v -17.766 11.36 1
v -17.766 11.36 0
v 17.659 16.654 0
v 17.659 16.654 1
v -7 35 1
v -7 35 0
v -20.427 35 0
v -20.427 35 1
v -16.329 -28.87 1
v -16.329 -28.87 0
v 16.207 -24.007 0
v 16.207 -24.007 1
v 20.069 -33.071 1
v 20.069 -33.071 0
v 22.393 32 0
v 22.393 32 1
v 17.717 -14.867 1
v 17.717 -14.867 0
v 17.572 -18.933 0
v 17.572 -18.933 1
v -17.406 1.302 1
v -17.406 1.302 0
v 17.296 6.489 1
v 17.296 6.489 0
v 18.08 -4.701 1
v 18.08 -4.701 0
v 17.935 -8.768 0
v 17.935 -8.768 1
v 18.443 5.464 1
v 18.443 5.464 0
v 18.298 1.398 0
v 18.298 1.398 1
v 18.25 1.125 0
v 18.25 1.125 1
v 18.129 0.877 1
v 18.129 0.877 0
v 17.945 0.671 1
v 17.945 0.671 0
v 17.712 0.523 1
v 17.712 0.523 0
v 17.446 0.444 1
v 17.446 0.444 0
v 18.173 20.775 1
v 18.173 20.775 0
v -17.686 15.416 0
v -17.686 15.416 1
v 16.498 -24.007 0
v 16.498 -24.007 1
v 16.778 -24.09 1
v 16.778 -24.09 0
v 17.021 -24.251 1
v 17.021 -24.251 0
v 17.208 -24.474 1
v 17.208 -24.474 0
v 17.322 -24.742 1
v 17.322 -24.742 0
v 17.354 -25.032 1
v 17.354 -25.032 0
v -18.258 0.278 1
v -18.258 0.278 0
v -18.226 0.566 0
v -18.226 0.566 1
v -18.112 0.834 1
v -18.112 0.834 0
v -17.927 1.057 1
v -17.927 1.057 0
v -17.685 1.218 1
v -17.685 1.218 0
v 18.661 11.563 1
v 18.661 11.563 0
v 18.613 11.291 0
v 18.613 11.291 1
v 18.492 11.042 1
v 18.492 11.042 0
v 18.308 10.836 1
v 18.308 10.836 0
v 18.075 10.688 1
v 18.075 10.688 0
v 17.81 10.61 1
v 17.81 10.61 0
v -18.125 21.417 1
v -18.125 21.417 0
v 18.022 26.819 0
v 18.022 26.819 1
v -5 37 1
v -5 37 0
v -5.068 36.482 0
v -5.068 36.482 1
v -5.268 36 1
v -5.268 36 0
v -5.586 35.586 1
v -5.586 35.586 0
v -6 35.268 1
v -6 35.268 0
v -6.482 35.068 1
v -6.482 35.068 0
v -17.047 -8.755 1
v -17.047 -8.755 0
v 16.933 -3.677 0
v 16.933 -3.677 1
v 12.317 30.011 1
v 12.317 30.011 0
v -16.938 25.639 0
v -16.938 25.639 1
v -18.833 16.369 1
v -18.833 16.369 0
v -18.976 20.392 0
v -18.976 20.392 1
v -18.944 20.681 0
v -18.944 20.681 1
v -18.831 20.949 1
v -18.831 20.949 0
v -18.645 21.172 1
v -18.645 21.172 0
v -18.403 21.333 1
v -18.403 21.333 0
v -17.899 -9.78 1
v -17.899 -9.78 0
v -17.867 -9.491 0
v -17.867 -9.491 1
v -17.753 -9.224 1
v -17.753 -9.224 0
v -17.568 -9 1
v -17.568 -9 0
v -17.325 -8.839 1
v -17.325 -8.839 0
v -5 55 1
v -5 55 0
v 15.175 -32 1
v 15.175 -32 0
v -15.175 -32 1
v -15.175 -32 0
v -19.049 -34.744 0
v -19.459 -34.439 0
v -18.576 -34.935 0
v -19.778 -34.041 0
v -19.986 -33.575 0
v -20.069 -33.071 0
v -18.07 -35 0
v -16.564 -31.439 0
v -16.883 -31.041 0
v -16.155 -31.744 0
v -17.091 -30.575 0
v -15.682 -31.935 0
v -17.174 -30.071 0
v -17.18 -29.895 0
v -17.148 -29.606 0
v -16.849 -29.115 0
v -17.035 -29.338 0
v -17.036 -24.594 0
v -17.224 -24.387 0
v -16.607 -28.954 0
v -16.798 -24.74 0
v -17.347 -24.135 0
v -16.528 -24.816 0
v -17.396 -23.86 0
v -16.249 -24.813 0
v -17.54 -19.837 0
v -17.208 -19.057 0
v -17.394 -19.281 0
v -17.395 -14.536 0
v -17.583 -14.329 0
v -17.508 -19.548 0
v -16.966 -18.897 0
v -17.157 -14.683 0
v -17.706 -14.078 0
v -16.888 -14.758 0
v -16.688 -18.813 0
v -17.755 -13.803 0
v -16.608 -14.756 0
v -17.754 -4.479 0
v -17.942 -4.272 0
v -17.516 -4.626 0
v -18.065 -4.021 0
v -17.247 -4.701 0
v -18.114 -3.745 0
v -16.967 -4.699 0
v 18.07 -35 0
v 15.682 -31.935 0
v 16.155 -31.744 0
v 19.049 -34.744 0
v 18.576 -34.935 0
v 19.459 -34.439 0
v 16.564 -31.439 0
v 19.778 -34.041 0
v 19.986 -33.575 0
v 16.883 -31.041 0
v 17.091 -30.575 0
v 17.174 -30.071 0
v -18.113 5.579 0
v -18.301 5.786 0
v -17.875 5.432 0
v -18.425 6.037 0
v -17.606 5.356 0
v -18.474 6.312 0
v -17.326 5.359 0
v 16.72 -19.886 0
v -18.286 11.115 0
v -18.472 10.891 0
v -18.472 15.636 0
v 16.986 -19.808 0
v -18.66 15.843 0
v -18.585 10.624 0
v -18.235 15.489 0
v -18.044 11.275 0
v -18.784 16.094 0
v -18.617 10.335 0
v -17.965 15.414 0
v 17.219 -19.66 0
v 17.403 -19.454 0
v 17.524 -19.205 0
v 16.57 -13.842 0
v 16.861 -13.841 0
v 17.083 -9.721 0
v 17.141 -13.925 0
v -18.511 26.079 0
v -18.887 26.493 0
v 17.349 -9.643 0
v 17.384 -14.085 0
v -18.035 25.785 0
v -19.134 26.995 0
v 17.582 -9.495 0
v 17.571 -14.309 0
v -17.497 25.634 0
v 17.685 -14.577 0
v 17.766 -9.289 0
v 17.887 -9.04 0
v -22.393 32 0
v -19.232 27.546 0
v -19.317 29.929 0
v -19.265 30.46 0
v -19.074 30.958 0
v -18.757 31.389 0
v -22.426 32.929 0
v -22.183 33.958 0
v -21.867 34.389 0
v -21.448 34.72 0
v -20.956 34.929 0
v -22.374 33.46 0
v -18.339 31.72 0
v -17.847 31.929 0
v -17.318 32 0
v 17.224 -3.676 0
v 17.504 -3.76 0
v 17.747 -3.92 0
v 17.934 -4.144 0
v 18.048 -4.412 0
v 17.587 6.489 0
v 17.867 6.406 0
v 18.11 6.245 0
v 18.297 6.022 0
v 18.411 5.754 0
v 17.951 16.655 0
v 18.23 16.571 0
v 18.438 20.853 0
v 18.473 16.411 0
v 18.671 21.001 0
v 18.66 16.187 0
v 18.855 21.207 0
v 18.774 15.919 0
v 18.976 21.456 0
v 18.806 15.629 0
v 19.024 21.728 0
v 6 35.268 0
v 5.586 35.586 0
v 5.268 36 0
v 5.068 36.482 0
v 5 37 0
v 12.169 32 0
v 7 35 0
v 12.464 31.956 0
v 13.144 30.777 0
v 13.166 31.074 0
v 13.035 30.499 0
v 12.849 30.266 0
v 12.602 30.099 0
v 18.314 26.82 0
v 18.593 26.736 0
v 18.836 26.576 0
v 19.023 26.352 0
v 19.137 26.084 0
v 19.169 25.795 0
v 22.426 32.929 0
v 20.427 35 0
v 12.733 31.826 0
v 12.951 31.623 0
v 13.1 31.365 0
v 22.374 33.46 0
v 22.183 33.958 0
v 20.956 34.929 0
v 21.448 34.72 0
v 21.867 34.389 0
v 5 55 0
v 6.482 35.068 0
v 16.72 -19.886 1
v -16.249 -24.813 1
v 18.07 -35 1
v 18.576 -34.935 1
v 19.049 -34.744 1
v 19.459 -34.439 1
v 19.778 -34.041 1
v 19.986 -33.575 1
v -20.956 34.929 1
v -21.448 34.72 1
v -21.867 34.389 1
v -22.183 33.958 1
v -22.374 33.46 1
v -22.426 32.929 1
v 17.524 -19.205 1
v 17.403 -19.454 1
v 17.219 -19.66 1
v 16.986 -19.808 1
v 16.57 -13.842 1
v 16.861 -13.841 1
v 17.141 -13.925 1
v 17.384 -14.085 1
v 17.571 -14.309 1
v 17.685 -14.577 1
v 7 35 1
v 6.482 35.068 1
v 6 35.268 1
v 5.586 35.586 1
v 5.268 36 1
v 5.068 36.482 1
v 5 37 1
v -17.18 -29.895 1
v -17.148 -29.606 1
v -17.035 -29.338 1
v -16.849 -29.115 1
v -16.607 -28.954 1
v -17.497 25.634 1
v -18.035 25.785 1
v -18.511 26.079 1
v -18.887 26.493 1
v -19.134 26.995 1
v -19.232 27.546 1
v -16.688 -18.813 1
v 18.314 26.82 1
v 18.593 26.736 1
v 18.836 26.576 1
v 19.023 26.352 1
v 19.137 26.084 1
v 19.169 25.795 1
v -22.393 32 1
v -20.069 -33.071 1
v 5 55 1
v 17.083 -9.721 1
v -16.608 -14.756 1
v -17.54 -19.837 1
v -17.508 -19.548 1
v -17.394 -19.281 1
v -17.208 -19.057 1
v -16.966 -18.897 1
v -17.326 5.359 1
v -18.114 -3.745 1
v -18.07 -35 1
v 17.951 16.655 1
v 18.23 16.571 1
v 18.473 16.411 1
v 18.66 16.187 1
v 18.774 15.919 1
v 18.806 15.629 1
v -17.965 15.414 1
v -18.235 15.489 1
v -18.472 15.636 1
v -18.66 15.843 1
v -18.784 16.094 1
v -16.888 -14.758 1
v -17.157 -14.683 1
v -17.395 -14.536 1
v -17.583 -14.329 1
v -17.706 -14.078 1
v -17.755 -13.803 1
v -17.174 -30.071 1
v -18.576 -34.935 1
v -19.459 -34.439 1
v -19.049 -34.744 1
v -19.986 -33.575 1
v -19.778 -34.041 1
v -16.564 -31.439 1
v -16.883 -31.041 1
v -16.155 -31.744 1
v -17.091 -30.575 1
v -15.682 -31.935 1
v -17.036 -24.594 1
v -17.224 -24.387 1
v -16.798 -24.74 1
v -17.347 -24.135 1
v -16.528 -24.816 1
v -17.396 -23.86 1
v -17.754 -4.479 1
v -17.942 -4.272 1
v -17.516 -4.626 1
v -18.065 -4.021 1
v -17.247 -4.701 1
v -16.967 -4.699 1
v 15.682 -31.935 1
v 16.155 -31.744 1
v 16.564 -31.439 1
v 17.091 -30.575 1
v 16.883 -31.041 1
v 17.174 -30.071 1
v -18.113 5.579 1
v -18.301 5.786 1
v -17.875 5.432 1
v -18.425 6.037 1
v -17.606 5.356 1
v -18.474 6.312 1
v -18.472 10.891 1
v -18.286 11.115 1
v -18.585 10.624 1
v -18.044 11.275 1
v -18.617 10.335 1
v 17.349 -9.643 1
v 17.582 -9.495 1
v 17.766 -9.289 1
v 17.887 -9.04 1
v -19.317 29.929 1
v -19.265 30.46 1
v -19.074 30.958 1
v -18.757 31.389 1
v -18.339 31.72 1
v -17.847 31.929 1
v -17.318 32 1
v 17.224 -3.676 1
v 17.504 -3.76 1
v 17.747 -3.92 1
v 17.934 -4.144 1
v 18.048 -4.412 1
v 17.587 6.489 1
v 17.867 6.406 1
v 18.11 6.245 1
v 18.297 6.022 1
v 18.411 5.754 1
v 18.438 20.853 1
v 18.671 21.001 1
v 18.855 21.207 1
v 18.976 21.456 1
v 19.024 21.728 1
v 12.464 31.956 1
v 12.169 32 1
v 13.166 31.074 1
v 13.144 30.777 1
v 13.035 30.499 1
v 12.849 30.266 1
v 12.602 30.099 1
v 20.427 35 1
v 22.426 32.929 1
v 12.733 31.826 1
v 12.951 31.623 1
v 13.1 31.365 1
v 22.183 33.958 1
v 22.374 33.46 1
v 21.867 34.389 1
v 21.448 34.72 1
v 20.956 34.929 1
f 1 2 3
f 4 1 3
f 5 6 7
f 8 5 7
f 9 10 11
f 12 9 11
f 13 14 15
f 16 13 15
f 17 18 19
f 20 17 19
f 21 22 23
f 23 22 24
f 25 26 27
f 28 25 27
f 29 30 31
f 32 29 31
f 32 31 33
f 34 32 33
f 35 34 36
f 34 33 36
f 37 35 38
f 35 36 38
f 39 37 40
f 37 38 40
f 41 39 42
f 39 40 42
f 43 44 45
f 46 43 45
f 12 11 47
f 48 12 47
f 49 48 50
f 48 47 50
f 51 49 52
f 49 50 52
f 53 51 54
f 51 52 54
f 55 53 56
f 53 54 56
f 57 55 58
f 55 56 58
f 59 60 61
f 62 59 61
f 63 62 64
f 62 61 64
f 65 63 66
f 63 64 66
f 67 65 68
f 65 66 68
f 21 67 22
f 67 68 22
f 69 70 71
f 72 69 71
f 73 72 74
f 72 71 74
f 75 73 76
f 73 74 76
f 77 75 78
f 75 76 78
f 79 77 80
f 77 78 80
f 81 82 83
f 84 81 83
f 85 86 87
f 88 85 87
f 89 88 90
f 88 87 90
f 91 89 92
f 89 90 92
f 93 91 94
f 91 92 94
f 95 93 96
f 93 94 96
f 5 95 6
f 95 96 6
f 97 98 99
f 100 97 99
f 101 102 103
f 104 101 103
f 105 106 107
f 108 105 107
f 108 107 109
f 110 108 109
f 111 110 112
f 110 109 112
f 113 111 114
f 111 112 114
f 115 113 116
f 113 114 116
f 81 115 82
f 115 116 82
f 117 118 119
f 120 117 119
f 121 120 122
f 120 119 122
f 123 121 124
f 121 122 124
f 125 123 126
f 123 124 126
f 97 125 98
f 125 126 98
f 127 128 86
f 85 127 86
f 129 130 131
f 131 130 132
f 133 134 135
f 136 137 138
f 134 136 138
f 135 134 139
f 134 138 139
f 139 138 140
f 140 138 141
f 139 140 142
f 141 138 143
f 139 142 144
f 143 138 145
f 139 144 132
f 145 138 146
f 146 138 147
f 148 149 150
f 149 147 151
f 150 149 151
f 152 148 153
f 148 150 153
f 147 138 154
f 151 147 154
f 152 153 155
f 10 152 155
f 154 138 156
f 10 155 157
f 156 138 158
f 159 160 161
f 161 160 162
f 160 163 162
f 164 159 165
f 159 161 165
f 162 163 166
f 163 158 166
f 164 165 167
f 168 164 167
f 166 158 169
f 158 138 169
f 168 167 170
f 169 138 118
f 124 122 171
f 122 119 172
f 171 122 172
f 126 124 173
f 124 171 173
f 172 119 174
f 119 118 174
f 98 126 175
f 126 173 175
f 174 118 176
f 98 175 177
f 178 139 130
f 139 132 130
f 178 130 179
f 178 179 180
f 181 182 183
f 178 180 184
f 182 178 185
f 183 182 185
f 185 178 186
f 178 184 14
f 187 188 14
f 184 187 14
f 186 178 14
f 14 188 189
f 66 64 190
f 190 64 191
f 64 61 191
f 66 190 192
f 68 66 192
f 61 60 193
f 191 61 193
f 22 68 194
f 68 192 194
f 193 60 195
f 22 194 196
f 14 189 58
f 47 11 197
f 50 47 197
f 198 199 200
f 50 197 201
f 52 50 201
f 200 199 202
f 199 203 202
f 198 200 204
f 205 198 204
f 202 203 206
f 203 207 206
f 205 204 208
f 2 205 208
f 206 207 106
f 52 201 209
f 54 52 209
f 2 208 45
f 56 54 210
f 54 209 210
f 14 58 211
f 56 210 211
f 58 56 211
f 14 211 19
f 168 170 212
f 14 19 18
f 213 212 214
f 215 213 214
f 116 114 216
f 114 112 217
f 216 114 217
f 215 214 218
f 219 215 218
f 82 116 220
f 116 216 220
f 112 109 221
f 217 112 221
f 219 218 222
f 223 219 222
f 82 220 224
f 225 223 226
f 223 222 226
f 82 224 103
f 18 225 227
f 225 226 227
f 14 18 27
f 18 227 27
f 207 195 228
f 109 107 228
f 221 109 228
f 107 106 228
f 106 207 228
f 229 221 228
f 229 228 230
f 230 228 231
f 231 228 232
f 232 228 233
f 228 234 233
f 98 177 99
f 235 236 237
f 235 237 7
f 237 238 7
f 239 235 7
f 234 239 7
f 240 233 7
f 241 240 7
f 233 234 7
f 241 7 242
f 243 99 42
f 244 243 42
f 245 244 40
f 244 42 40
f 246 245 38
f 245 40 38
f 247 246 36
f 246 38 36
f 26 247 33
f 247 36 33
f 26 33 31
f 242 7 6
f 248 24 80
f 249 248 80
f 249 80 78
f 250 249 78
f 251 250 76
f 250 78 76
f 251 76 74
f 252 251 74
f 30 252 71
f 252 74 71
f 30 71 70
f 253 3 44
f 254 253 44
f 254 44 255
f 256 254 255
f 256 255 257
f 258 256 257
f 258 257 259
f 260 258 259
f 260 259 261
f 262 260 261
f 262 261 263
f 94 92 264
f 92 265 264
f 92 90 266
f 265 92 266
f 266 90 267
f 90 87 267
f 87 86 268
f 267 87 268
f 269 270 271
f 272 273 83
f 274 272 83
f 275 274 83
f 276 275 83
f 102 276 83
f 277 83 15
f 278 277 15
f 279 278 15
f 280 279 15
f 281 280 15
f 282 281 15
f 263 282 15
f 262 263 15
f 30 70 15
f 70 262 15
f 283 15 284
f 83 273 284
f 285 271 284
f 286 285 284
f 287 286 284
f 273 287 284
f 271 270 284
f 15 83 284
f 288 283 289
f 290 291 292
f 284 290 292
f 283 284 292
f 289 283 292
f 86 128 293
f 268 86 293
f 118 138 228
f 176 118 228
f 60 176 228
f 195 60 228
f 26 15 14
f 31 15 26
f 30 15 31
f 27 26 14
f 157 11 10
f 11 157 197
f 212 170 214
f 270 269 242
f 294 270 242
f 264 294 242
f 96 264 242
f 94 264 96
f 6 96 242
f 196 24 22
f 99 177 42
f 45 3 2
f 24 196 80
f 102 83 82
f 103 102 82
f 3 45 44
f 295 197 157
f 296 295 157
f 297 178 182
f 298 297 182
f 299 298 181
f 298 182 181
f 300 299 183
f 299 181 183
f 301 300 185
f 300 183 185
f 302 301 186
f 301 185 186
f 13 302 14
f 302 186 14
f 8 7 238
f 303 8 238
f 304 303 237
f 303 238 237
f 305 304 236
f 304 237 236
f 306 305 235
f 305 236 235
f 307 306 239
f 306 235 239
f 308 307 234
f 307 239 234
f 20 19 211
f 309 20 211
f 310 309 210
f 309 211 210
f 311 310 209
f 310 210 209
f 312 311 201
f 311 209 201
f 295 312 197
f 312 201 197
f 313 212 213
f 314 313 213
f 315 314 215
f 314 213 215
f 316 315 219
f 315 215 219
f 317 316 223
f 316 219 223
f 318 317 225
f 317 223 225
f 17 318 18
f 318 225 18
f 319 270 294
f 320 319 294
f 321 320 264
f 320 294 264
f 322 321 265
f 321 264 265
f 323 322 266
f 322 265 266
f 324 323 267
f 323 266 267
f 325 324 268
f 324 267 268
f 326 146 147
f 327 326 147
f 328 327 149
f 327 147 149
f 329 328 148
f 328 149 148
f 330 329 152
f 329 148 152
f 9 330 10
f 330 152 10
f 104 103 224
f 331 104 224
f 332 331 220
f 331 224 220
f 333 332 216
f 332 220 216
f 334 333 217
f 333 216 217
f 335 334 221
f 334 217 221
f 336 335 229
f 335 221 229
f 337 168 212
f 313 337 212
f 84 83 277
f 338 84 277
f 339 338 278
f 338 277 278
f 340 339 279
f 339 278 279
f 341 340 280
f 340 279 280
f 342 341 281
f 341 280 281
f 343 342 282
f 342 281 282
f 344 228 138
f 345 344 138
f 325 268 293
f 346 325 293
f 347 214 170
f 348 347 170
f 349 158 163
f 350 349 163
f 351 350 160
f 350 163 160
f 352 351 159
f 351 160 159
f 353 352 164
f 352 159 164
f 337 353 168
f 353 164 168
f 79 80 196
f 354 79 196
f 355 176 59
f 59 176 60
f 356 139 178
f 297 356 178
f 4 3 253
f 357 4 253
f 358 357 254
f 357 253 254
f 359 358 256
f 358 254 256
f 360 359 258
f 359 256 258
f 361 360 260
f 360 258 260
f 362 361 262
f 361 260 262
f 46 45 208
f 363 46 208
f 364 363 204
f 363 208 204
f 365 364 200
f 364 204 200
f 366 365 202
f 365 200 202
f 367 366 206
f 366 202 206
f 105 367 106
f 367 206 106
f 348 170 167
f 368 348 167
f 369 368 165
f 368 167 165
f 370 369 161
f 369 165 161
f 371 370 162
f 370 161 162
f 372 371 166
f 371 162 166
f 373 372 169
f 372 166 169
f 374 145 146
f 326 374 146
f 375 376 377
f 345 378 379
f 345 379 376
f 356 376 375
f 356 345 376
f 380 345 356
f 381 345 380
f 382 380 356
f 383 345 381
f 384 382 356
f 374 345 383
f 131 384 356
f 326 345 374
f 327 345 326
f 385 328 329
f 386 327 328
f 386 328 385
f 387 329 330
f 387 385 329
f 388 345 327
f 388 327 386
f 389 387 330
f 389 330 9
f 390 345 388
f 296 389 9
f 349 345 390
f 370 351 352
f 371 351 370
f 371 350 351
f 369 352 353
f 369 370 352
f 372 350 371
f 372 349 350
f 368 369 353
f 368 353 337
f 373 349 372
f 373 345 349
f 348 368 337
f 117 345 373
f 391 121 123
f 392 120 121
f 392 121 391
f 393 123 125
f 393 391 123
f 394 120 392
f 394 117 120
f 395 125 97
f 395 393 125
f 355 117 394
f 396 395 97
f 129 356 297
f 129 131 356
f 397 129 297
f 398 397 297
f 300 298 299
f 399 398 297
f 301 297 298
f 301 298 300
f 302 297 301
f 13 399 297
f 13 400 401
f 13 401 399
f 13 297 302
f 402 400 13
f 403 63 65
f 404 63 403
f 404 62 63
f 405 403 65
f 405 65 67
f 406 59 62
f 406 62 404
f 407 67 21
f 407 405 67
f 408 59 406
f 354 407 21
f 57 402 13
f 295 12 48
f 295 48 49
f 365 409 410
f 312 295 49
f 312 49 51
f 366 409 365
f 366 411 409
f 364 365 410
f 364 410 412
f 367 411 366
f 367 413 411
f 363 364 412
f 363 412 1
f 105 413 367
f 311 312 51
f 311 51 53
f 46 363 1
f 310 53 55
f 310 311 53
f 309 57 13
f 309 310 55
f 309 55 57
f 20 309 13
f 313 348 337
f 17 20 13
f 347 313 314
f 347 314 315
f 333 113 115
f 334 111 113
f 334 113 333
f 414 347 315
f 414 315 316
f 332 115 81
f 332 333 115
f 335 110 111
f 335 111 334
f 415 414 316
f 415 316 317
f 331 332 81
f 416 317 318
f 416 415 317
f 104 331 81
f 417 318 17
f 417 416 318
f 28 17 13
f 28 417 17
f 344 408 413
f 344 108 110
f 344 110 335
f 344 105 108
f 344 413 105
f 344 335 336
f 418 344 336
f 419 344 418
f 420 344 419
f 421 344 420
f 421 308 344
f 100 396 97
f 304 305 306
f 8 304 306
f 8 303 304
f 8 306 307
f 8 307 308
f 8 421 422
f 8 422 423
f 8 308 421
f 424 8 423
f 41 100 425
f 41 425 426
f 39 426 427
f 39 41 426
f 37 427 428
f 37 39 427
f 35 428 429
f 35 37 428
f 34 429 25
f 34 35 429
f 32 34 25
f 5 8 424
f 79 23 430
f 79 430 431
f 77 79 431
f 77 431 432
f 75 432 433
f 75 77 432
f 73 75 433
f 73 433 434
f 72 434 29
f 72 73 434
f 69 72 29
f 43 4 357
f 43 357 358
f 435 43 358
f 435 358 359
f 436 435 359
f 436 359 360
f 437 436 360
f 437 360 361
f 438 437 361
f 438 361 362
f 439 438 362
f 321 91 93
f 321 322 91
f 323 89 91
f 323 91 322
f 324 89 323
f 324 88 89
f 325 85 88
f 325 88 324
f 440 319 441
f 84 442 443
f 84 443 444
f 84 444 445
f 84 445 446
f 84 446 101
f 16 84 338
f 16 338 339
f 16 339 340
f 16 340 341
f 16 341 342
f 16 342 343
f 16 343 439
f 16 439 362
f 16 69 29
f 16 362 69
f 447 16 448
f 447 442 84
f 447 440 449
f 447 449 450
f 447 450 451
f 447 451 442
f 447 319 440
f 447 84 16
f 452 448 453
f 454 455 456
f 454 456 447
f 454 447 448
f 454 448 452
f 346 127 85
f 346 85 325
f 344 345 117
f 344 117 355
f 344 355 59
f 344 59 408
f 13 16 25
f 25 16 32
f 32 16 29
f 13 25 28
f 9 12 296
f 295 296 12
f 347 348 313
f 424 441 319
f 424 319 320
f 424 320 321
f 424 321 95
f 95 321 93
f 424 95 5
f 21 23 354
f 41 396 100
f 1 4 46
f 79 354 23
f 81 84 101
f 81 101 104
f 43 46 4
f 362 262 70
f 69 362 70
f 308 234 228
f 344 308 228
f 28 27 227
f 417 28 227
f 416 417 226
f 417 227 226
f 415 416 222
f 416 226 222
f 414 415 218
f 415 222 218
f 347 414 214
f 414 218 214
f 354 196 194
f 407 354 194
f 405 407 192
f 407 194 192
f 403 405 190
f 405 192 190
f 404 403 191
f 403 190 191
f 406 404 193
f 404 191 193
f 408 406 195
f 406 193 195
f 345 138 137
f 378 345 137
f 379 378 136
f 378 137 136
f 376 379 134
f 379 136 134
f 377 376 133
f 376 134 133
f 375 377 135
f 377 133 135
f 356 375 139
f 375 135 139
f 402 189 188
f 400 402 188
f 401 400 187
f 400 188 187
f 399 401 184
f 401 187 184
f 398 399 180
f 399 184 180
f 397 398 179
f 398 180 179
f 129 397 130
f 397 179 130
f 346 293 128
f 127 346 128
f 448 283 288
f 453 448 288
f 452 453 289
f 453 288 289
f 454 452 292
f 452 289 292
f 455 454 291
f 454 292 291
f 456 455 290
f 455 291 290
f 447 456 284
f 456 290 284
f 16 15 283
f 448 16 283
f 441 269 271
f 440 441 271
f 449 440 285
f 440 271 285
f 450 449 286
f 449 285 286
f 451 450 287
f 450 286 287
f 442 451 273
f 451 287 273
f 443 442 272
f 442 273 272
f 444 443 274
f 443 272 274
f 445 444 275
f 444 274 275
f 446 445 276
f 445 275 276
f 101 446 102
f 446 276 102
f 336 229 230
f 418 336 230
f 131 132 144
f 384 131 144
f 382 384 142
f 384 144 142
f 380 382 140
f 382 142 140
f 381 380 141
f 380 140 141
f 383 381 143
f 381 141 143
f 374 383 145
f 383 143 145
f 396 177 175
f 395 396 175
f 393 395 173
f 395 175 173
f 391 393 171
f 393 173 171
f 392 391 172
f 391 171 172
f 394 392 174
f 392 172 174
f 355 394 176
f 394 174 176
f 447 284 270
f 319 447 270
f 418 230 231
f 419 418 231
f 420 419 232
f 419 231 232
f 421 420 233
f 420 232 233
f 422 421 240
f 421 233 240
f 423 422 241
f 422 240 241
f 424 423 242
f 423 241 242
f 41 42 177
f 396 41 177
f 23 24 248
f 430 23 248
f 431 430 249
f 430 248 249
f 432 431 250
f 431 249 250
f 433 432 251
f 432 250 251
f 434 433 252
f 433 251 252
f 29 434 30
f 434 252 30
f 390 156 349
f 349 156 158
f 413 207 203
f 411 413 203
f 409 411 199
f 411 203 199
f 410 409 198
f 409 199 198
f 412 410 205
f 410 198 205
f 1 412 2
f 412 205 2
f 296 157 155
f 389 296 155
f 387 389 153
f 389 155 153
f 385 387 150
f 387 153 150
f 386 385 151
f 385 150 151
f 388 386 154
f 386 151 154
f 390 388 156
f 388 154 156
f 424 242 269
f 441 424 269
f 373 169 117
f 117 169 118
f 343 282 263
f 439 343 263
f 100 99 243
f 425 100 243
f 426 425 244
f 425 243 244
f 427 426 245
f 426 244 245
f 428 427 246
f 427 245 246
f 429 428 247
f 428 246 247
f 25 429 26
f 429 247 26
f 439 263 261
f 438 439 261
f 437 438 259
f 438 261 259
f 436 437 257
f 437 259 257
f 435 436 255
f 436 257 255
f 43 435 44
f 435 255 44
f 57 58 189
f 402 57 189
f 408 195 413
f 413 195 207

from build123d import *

# Parameters (mm, degrees)
F1_DEPTH = 1


with BuildPart() as f1:
    # F0 (on Top) → F1 (new body)
    with BuildSketch(Plane.XY):
        with BuildLine():
            Line((-22.392857, 32), (-20.068879, -33.071383))
            ThreePointArc((-20.068879, -33.071383), (-19.4589, -34.43923), (-18.070153, -35))
            Line((-18.070153, -35), (18.070153, -35))
            ThreePointArc((18.070153, -35), (19.4589, -34.43923), (20.068879, -33.071383))
            Line((20.068879, -33.071383), (22.392857, 32))
            Line((22.392857, 32), (22.426022, 32.928617))
            ThreePointArc((22.426022, 32.928617), (21.866526, 34.388747), (20.427296, 35))
            Line((20.427296, 35), (7, 35))
            ThreePointArc((7, 35), (5.585786, 35.585786), (5, 37))
            Line((5, 37), (5, 55))
            Line((5, 55), (-5, 55))
            Line((-5, 55), (-5, 37))
            ThreePointArc((-5, 37), (-5.585786, 35.585786), (-7, 35))
            Line((-7, 35), (-20.427296, 35))
            ThreePointArc((-20.427296, 35), (-21.866526, 34.388747), (-22.426022, 32.928617))
            Line((-22.426022, 32.928617), (-22.392857, 32))
        make_face()
        with BuildLine():
            Line((-16.32887, -28.869881), (16.206912, -24.007376))
            ThreePointArc((16.206912, -24.007376), (17.020899, -24.250598), (17.354084, -25.032083))
            Line((17.354084, -25.032083), (17.174109, -30.071383))
            ThreePointArc((17.174109, -30.071383), (16.56413, -31.43923), (15.175384, -32))
            Line((15.175384, -32), (-15.175384, -32))
            ThreePointArc((-15.175384, -32), (-16.56413, -31.43923), (-17.174109, -30.071383))
            Line((-17.174109, -30.071383), (-17.180423, -29.894589))
            ThreePointArc((-17.180423, -29.894589), (-16.950156, -29.219763), (-16.32887, -28.869881))
        make_face(mode=Mode.SUBTRACT)
        with BuildLine():
            Line((-16.688062, -18.812502), (16.569959, -13.842057))
            ThreePointArc((16.569959, -13.842057), (17.383946, -14.085279), (17.717131, -14.866764))
            Line((17.717131, -14.866764), (17.571913, -18.932892))
            ThreePointArc((17.571913, -18.932892), (17.318343, -19.563378), (16.720359, -19.886216))
            Line((16.720359, -19.886216), (-16.248766, -24.813485))
            ThreePointArc((-16.248766, -24.813485), (-17.03571, -24.593564), (-17.395939, -23.860161))
            Line((-17.395939, -23.860161), (-17.539616, -19.837209))
            ThreePointArc((-17.539616, -19.837209), (-17.309348, -19.162383), (-16.688062, -18.812502))
        make_face(mode=Mode.SUBTRACT)
        with BuildLine():
            Line((-17.047254, -8.755122), (16.933006, -3.676738))
            ThreePointArc((16.933006, -3.676738), (17.746993, -3.91996), (18.080179, -4.701445))
            Line((18.080179, -4.701445), (17.93496, -8.767573))
            ThreePointArc((17.93496, -8.767573), (17.68139, -9.398059), (17.083406, -9.720897))
            Line((17.083406, -9.720897), (-16.607959, -14.756106))
            ThreePointArc((-16.607959, -14.756106), (-17.394902, -14.536185), (-17.755131, -13.802781))
            Line((-17.755131, -13.802781), (-17.898808, -9.779829))
            ThreePointArc((-17.898808, -9.779829), (-17.66854, -9.105003), (-17.047254, -8.755122))
        make_face(mode=Mode.SUBTRACT)
        with BuildLine():
            Line((-17.406446, 1.302258), (17.296053, 6.488581))
            ThreePointArc((17.296053, 6.488581), (18.11004, 6.245359), (18.443226, 5.463874))
            Line((18.443226, 5.463874), (18.298007, 1.397746))
            ThreePointArc((18.298007, 1.397746), (18.044437, 0.76726), (17.446453, 0.444422))
            Line((17.446453, 0.444422), (-16.967151, -4.698726))
            ThreePointArc((-16.967151, -4.698726), (-17.754094, -4.478805), (-18.114323, -3.745402))
            Line((-18.114323, -3.745402), (-18.258, 0.27755))
            ThreePointArc((-18.258, 0.27755), (-18.027732, 0.952376), (-17.406446, 1.302258))
        make_face(mode=Mode.SUBTRACT)
        with BuildLine():
            ThreePointArc((12.16906, 32), (13.16631, 31.074108), (12.31687, 30.010984))
            Line((12.31687, 30.010984), (-16.937512, 25.638888))
            ThreePointArc((-16.937512, 25.638888), (-18.511399, 26.078729), (-19.231856, 27.545536))
            Line((-19.231856, 27.545536), (-19.316967, 29.928617))
            ThreePointArc((-19.316967, 29.928617), (-18.757471, 31.388747), (-17.318241, 32))
            Line((-17.318241, 32), (12.16906, 32))
        make_face(mode=Mode.SUBTRACT)
        with BuildLine():
            Line((-17.765639, 11.359637), (17.659101, 16.6539))
            ThreePointArc((17.659101, 16.6539), (18.473087, 16.410678), (18.806273, 15.629193))
            Line((18.806273, 15.629193), (18.661054, 11.563065))
            ThreePointArc((18.661054, 11.563065), (18.407485, 10.932579), (17.809501, 10.609741))
            Line((17.809501, 10.609741), (-17.326343, 5.358654))
            ThreePointArc((-17.326343, 5.358654), (-18.113287, 5.578575), (-18.473515, 6.311978))
            Line((-18.473515, 6.311978), (-18.617192, 10.33493))
            ThreePointArc((-18.617192, 10.33493), (-18.386924, 11.009756), (-17.765639, 11.359637))
        make_face(mode=Mode.SUBTRACT)
        with BuildLine():
            Line((-18.124831, 21.417017), (18.022148, 26.819219))
            ThreePointArc((18.022148, 26.819219), (18.836134, 26.575997), (19.16932, 25.794512))
            Line((19.16932, 25.794512), (19.024101, 21.728384))
            ThreePointArc((19.024101, 21.728384), (18.770532, 21.097898), (18.172548, 20.77506))
            Line((18.172548, 20.77506), (-17.685535, 15.416033))
            ThreePointArc((-17.685535, 15.416033), (-18.472479, 15.635954), (-18.832707, 16.369358))
            Line((-18.832707, 16.369358), (-18.976384, 20.39231))
            ThreePointArc((-18.976384, 20.39231), (-18.746116, 21.067135), (-18.124831, 21.417017))
        make_face(mode=Mode.SUBTRACT)
    extrude(amount=F1_DEPTH)


solid = f1.part
